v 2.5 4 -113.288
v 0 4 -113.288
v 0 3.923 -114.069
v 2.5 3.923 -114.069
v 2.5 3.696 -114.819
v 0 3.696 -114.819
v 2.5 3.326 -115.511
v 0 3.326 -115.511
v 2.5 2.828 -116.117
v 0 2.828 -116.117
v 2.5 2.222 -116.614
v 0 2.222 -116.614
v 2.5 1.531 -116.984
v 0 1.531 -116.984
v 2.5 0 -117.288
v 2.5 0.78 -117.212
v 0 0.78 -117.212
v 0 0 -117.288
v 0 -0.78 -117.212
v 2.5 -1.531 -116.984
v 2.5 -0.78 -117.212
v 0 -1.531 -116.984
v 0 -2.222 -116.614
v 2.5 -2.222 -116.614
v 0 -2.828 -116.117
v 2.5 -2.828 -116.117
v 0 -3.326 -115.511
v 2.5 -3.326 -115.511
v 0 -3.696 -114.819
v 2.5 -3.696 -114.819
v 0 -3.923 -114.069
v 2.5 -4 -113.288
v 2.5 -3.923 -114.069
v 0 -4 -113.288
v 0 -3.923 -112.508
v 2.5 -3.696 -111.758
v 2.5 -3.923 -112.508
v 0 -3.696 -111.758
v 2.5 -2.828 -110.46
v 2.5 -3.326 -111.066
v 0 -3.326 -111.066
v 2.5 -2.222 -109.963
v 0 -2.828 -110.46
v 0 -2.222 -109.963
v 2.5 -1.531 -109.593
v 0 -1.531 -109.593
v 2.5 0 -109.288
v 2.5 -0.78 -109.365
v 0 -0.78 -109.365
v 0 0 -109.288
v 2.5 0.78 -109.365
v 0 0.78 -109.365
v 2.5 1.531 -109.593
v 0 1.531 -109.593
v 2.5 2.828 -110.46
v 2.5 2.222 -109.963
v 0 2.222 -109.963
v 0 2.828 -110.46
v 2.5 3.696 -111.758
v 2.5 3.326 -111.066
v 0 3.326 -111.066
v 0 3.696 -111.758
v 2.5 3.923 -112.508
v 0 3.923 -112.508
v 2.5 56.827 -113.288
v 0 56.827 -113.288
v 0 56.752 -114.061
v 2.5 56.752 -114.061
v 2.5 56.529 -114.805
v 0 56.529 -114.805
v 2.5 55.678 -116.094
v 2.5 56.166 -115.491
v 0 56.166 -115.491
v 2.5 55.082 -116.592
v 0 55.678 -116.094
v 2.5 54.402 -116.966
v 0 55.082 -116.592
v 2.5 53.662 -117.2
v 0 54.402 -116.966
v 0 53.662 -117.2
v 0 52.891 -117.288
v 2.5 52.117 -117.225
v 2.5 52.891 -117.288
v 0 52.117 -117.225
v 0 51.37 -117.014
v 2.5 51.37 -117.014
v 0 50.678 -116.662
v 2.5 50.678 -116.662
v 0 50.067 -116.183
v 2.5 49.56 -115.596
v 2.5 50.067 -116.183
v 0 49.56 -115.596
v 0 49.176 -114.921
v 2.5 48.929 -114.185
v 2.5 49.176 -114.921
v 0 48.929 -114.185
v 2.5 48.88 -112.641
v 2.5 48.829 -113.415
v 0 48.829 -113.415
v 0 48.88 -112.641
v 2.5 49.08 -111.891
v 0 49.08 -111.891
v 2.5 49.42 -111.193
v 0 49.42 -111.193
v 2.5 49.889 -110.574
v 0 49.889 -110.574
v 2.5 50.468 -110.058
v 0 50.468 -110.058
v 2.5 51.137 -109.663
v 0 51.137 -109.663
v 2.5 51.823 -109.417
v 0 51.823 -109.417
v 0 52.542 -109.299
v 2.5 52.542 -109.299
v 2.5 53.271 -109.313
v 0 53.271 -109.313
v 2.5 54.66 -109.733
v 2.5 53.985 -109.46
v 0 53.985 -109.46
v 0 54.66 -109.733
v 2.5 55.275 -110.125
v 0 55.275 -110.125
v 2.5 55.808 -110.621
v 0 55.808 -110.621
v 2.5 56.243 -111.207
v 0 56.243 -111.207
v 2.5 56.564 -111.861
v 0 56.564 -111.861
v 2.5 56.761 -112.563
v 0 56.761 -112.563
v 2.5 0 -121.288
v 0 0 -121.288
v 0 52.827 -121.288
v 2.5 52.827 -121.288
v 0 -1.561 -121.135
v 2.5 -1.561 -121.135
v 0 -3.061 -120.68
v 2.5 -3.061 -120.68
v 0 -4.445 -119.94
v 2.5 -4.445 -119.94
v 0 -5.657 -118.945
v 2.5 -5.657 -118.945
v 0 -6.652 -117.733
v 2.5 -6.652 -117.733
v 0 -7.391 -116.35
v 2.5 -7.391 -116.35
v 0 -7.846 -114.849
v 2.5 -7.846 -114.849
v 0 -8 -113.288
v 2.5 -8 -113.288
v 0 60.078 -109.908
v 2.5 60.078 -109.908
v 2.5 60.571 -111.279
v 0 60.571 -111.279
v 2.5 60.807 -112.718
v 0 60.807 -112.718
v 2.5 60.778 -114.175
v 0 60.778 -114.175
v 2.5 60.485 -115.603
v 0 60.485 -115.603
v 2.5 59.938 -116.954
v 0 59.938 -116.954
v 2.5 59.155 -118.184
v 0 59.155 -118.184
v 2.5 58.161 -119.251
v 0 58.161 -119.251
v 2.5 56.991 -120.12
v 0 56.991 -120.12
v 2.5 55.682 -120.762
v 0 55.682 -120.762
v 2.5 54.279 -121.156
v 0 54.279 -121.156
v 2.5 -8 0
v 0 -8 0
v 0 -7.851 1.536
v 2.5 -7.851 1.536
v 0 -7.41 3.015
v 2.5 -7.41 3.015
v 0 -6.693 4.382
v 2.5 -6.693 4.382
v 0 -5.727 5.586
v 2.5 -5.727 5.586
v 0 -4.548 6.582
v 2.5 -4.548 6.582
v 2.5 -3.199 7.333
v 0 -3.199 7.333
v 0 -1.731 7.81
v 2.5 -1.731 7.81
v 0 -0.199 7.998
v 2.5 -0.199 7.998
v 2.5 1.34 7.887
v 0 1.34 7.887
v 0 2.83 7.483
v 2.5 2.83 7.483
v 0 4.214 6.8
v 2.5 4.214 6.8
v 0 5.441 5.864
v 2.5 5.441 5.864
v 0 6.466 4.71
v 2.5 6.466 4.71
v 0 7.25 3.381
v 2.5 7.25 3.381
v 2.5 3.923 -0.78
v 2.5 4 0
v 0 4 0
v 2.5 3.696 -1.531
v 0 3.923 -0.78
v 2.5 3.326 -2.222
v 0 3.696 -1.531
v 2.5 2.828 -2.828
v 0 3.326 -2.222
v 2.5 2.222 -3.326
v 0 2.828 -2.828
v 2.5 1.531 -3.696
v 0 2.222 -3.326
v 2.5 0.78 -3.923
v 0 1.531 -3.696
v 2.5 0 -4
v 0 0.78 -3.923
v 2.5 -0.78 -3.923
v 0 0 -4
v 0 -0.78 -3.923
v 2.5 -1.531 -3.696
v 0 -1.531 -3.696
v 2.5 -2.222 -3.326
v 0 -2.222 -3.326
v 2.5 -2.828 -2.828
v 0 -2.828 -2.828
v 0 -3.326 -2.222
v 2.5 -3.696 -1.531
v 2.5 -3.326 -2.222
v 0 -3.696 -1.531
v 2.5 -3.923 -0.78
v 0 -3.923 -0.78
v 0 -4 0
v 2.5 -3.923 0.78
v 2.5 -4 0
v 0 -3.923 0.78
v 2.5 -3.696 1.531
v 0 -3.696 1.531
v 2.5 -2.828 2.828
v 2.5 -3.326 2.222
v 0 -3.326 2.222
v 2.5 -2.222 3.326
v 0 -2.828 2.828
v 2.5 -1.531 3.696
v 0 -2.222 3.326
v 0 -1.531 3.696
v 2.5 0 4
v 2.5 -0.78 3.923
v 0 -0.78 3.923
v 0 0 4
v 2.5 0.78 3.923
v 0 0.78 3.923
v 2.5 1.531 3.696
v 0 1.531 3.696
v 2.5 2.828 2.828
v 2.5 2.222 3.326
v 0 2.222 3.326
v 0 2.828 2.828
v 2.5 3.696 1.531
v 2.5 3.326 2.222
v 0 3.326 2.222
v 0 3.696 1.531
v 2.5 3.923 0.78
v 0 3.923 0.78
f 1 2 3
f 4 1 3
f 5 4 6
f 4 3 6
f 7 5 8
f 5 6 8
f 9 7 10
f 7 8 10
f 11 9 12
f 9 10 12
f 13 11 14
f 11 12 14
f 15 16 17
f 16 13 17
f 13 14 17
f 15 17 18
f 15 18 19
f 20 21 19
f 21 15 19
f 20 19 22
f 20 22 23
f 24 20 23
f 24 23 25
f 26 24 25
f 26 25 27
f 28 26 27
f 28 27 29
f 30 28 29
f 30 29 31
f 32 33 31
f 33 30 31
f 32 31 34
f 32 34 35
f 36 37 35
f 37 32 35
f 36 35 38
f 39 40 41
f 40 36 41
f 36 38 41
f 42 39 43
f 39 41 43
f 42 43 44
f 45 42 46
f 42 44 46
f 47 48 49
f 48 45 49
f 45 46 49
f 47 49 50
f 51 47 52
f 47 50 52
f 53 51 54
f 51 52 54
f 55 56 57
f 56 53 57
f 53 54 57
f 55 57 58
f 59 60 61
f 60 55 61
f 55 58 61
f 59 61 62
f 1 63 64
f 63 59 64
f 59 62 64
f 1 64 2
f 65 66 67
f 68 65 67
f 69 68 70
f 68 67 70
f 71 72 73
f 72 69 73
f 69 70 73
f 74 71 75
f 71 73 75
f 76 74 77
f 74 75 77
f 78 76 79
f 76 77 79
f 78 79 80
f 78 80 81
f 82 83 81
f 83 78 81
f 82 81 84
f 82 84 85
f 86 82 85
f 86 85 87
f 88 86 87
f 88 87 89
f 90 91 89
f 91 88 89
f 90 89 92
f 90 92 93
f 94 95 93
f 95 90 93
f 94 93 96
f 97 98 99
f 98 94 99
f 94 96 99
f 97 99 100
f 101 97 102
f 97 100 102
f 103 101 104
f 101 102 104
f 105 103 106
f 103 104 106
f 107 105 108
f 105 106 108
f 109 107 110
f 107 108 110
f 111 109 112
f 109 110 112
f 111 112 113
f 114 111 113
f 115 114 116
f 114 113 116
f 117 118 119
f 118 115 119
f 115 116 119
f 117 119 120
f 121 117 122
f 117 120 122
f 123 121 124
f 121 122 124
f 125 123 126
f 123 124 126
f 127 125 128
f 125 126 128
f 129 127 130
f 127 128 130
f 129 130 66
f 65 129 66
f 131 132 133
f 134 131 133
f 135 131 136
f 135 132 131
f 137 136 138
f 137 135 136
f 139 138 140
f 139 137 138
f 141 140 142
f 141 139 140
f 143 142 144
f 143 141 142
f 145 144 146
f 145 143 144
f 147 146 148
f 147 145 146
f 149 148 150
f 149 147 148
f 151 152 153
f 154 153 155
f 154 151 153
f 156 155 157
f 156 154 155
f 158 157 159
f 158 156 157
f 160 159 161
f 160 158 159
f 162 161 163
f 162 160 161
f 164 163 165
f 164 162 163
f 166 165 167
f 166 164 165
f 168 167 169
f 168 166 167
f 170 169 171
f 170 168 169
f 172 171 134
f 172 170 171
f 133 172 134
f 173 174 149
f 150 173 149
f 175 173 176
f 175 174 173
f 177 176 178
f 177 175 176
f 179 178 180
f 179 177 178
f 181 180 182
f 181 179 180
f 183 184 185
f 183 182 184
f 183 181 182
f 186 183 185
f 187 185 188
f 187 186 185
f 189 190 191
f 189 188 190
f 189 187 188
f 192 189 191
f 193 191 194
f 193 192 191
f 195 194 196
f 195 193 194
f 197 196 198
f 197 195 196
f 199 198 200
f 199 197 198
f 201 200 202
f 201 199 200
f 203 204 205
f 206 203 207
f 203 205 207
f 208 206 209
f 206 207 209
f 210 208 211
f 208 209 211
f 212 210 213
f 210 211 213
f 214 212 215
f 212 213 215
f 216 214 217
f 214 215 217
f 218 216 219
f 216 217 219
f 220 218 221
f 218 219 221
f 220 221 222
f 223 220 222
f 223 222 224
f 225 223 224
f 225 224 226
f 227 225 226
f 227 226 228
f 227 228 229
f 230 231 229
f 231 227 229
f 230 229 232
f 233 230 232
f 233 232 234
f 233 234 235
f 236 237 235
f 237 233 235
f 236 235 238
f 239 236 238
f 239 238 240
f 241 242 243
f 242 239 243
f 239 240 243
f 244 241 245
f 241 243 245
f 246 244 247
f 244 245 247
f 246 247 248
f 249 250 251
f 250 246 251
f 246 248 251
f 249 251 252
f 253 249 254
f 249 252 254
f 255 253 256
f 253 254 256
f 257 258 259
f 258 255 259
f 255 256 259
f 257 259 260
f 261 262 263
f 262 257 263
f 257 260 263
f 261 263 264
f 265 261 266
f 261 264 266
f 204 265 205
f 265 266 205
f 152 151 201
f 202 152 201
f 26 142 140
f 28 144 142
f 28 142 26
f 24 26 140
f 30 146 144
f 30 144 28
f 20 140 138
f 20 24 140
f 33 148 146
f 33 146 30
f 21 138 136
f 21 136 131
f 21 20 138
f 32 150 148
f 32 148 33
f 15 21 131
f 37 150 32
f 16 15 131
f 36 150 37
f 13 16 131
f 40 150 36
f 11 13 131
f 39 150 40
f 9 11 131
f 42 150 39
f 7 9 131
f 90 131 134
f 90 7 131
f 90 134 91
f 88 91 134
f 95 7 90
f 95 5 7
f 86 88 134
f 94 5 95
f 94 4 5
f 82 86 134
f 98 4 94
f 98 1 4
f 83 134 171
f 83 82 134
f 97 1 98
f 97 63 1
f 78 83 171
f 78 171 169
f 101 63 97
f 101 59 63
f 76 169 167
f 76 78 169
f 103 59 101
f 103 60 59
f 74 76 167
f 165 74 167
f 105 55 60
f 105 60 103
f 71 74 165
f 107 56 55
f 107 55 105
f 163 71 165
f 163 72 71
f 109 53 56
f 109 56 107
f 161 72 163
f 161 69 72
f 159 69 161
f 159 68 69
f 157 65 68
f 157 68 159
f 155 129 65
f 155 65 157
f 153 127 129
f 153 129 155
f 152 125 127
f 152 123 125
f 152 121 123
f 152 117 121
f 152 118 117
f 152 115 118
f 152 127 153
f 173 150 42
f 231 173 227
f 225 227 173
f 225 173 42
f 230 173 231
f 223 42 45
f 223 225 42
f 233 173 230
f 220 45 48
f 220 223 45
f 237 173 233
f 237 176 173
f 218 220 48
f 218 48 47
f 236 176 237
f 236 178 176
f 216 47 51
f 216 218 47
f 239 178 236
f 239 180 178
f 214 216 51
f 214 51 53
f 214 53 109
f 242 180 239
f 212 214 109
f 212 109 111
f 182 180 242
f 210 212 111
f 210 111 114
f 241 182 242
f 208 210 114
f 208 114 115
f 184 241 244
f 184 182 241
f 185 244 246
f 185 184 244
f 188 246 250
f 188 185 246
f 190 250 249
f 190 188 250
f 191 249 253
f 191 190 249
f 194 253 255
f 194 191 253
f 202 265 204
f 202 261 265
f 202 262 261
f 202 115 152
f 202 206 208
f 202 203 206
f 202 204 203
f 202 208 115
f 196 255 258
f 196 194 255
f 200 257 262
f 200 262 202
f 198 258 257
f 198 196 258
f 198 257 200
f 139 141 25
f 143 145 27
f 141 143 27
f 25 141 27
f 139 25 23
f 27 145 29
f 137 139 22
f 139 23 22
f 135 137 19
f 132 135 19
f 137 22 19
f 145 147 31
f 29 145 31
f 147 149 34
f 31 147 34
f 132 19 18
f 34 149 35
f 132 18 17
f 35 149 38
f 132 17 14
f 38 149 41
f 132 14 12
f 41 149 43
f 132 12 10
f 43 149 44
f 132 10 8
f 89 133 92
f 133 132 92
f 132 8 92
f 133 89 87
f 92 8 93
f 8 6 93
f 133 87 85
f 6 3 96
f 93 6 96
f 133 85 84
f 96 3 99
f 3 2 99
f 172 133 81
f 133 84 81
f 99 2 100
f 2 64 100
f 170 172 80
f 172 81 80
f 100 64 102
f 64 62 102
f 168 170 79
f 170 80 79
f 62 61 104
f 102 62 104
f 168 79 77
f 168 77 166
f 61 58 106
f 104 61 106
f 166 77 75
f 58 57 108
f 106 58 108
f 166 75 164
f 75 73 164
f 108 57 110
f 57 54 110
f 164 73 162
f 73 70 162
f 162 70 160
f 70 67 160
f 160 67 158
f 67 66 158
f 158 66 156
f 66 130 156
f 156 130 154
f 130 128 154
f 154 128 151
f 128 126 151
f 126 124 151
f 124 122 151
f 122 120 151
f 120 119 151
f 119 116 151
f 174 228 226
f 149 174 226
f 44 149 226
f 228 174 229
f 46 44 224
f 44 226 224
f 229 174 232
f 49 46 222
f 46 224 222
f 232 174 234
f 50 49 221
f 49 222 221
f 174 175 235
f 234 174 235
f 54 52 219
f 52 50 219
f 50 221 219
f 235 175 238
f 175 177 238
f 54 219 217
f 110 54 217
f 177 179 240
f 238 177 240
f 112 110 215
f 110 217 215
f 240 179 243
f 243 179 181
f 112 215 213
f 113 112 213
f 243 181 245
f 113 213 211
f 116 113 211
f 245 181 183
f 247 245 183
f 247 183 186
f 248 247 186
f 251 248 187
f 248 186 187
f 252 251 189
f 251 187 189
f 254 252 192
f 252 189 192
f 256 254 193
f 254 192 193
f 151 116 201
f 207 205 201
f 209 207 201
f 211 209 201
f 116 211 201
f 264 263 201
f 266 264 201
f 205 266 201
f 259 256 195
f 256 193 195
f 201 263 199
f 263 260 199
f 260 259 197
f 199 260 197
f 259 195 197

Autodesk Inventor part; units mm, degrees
ref_plane "YZ Plane" through (0, 0, 0) normal (1, 0, 0) x (0, 1, 0)
ref_plane "XZ Plane" through (0, 0, 0) normal (0, 1, 0) x (-1, 0, 0)
ref_plane "XY Plane" through (0, 0, 0) normal (0, 0, 1) x (1, 0, 0)
sketch "Sketch1" plane through (0, 0, 0) normal (1, 0, 0) x (0, 1, 0)
  line L0 (0, 0) -> (52.8273, -113.2885)
  line L1 (0, 0) -> (0, -113.2885)
  circle A0 centre (52.8273, -113.2885) radius 4
  circle A1 centre (0, 0) radius 4
  circle A2 centre (52.8273, -113.2885) radius 8
  circle A3 centre (0, 0) radius 8
  line L2 (60.0777, -109.9075) -> (7.2505, 3.3809)
  circle A4 centre (0, -113.2885) radius 8
  line L3 (-8, 0) -> (-8, -113.2885)
  line L4 (0, -121.2885) -> (52.8273, -121.2885)
  circle A5 centre (0, -113.2885) radius 4
  dimension "d0" = 125
  dimension "d1" = 25
  dimension "d2" = 8
  dimension "d3" = 8
  dimension "d4" = 16
  dimension "d5" = 16
  dimension "d6" = 16
  dimension "d7" = 8
extrude "Extrusion1" add sketch "Sketch1" along normal blind 2.5 contours A1 L1 A3 L0 | L0 A3 L1 A1 | A3 L2 A2 L0 | L0 A2 L4 A4 L1 A3 | L1 A4 L3 A3 | A2 | A4
properties part number "RockerFront"
